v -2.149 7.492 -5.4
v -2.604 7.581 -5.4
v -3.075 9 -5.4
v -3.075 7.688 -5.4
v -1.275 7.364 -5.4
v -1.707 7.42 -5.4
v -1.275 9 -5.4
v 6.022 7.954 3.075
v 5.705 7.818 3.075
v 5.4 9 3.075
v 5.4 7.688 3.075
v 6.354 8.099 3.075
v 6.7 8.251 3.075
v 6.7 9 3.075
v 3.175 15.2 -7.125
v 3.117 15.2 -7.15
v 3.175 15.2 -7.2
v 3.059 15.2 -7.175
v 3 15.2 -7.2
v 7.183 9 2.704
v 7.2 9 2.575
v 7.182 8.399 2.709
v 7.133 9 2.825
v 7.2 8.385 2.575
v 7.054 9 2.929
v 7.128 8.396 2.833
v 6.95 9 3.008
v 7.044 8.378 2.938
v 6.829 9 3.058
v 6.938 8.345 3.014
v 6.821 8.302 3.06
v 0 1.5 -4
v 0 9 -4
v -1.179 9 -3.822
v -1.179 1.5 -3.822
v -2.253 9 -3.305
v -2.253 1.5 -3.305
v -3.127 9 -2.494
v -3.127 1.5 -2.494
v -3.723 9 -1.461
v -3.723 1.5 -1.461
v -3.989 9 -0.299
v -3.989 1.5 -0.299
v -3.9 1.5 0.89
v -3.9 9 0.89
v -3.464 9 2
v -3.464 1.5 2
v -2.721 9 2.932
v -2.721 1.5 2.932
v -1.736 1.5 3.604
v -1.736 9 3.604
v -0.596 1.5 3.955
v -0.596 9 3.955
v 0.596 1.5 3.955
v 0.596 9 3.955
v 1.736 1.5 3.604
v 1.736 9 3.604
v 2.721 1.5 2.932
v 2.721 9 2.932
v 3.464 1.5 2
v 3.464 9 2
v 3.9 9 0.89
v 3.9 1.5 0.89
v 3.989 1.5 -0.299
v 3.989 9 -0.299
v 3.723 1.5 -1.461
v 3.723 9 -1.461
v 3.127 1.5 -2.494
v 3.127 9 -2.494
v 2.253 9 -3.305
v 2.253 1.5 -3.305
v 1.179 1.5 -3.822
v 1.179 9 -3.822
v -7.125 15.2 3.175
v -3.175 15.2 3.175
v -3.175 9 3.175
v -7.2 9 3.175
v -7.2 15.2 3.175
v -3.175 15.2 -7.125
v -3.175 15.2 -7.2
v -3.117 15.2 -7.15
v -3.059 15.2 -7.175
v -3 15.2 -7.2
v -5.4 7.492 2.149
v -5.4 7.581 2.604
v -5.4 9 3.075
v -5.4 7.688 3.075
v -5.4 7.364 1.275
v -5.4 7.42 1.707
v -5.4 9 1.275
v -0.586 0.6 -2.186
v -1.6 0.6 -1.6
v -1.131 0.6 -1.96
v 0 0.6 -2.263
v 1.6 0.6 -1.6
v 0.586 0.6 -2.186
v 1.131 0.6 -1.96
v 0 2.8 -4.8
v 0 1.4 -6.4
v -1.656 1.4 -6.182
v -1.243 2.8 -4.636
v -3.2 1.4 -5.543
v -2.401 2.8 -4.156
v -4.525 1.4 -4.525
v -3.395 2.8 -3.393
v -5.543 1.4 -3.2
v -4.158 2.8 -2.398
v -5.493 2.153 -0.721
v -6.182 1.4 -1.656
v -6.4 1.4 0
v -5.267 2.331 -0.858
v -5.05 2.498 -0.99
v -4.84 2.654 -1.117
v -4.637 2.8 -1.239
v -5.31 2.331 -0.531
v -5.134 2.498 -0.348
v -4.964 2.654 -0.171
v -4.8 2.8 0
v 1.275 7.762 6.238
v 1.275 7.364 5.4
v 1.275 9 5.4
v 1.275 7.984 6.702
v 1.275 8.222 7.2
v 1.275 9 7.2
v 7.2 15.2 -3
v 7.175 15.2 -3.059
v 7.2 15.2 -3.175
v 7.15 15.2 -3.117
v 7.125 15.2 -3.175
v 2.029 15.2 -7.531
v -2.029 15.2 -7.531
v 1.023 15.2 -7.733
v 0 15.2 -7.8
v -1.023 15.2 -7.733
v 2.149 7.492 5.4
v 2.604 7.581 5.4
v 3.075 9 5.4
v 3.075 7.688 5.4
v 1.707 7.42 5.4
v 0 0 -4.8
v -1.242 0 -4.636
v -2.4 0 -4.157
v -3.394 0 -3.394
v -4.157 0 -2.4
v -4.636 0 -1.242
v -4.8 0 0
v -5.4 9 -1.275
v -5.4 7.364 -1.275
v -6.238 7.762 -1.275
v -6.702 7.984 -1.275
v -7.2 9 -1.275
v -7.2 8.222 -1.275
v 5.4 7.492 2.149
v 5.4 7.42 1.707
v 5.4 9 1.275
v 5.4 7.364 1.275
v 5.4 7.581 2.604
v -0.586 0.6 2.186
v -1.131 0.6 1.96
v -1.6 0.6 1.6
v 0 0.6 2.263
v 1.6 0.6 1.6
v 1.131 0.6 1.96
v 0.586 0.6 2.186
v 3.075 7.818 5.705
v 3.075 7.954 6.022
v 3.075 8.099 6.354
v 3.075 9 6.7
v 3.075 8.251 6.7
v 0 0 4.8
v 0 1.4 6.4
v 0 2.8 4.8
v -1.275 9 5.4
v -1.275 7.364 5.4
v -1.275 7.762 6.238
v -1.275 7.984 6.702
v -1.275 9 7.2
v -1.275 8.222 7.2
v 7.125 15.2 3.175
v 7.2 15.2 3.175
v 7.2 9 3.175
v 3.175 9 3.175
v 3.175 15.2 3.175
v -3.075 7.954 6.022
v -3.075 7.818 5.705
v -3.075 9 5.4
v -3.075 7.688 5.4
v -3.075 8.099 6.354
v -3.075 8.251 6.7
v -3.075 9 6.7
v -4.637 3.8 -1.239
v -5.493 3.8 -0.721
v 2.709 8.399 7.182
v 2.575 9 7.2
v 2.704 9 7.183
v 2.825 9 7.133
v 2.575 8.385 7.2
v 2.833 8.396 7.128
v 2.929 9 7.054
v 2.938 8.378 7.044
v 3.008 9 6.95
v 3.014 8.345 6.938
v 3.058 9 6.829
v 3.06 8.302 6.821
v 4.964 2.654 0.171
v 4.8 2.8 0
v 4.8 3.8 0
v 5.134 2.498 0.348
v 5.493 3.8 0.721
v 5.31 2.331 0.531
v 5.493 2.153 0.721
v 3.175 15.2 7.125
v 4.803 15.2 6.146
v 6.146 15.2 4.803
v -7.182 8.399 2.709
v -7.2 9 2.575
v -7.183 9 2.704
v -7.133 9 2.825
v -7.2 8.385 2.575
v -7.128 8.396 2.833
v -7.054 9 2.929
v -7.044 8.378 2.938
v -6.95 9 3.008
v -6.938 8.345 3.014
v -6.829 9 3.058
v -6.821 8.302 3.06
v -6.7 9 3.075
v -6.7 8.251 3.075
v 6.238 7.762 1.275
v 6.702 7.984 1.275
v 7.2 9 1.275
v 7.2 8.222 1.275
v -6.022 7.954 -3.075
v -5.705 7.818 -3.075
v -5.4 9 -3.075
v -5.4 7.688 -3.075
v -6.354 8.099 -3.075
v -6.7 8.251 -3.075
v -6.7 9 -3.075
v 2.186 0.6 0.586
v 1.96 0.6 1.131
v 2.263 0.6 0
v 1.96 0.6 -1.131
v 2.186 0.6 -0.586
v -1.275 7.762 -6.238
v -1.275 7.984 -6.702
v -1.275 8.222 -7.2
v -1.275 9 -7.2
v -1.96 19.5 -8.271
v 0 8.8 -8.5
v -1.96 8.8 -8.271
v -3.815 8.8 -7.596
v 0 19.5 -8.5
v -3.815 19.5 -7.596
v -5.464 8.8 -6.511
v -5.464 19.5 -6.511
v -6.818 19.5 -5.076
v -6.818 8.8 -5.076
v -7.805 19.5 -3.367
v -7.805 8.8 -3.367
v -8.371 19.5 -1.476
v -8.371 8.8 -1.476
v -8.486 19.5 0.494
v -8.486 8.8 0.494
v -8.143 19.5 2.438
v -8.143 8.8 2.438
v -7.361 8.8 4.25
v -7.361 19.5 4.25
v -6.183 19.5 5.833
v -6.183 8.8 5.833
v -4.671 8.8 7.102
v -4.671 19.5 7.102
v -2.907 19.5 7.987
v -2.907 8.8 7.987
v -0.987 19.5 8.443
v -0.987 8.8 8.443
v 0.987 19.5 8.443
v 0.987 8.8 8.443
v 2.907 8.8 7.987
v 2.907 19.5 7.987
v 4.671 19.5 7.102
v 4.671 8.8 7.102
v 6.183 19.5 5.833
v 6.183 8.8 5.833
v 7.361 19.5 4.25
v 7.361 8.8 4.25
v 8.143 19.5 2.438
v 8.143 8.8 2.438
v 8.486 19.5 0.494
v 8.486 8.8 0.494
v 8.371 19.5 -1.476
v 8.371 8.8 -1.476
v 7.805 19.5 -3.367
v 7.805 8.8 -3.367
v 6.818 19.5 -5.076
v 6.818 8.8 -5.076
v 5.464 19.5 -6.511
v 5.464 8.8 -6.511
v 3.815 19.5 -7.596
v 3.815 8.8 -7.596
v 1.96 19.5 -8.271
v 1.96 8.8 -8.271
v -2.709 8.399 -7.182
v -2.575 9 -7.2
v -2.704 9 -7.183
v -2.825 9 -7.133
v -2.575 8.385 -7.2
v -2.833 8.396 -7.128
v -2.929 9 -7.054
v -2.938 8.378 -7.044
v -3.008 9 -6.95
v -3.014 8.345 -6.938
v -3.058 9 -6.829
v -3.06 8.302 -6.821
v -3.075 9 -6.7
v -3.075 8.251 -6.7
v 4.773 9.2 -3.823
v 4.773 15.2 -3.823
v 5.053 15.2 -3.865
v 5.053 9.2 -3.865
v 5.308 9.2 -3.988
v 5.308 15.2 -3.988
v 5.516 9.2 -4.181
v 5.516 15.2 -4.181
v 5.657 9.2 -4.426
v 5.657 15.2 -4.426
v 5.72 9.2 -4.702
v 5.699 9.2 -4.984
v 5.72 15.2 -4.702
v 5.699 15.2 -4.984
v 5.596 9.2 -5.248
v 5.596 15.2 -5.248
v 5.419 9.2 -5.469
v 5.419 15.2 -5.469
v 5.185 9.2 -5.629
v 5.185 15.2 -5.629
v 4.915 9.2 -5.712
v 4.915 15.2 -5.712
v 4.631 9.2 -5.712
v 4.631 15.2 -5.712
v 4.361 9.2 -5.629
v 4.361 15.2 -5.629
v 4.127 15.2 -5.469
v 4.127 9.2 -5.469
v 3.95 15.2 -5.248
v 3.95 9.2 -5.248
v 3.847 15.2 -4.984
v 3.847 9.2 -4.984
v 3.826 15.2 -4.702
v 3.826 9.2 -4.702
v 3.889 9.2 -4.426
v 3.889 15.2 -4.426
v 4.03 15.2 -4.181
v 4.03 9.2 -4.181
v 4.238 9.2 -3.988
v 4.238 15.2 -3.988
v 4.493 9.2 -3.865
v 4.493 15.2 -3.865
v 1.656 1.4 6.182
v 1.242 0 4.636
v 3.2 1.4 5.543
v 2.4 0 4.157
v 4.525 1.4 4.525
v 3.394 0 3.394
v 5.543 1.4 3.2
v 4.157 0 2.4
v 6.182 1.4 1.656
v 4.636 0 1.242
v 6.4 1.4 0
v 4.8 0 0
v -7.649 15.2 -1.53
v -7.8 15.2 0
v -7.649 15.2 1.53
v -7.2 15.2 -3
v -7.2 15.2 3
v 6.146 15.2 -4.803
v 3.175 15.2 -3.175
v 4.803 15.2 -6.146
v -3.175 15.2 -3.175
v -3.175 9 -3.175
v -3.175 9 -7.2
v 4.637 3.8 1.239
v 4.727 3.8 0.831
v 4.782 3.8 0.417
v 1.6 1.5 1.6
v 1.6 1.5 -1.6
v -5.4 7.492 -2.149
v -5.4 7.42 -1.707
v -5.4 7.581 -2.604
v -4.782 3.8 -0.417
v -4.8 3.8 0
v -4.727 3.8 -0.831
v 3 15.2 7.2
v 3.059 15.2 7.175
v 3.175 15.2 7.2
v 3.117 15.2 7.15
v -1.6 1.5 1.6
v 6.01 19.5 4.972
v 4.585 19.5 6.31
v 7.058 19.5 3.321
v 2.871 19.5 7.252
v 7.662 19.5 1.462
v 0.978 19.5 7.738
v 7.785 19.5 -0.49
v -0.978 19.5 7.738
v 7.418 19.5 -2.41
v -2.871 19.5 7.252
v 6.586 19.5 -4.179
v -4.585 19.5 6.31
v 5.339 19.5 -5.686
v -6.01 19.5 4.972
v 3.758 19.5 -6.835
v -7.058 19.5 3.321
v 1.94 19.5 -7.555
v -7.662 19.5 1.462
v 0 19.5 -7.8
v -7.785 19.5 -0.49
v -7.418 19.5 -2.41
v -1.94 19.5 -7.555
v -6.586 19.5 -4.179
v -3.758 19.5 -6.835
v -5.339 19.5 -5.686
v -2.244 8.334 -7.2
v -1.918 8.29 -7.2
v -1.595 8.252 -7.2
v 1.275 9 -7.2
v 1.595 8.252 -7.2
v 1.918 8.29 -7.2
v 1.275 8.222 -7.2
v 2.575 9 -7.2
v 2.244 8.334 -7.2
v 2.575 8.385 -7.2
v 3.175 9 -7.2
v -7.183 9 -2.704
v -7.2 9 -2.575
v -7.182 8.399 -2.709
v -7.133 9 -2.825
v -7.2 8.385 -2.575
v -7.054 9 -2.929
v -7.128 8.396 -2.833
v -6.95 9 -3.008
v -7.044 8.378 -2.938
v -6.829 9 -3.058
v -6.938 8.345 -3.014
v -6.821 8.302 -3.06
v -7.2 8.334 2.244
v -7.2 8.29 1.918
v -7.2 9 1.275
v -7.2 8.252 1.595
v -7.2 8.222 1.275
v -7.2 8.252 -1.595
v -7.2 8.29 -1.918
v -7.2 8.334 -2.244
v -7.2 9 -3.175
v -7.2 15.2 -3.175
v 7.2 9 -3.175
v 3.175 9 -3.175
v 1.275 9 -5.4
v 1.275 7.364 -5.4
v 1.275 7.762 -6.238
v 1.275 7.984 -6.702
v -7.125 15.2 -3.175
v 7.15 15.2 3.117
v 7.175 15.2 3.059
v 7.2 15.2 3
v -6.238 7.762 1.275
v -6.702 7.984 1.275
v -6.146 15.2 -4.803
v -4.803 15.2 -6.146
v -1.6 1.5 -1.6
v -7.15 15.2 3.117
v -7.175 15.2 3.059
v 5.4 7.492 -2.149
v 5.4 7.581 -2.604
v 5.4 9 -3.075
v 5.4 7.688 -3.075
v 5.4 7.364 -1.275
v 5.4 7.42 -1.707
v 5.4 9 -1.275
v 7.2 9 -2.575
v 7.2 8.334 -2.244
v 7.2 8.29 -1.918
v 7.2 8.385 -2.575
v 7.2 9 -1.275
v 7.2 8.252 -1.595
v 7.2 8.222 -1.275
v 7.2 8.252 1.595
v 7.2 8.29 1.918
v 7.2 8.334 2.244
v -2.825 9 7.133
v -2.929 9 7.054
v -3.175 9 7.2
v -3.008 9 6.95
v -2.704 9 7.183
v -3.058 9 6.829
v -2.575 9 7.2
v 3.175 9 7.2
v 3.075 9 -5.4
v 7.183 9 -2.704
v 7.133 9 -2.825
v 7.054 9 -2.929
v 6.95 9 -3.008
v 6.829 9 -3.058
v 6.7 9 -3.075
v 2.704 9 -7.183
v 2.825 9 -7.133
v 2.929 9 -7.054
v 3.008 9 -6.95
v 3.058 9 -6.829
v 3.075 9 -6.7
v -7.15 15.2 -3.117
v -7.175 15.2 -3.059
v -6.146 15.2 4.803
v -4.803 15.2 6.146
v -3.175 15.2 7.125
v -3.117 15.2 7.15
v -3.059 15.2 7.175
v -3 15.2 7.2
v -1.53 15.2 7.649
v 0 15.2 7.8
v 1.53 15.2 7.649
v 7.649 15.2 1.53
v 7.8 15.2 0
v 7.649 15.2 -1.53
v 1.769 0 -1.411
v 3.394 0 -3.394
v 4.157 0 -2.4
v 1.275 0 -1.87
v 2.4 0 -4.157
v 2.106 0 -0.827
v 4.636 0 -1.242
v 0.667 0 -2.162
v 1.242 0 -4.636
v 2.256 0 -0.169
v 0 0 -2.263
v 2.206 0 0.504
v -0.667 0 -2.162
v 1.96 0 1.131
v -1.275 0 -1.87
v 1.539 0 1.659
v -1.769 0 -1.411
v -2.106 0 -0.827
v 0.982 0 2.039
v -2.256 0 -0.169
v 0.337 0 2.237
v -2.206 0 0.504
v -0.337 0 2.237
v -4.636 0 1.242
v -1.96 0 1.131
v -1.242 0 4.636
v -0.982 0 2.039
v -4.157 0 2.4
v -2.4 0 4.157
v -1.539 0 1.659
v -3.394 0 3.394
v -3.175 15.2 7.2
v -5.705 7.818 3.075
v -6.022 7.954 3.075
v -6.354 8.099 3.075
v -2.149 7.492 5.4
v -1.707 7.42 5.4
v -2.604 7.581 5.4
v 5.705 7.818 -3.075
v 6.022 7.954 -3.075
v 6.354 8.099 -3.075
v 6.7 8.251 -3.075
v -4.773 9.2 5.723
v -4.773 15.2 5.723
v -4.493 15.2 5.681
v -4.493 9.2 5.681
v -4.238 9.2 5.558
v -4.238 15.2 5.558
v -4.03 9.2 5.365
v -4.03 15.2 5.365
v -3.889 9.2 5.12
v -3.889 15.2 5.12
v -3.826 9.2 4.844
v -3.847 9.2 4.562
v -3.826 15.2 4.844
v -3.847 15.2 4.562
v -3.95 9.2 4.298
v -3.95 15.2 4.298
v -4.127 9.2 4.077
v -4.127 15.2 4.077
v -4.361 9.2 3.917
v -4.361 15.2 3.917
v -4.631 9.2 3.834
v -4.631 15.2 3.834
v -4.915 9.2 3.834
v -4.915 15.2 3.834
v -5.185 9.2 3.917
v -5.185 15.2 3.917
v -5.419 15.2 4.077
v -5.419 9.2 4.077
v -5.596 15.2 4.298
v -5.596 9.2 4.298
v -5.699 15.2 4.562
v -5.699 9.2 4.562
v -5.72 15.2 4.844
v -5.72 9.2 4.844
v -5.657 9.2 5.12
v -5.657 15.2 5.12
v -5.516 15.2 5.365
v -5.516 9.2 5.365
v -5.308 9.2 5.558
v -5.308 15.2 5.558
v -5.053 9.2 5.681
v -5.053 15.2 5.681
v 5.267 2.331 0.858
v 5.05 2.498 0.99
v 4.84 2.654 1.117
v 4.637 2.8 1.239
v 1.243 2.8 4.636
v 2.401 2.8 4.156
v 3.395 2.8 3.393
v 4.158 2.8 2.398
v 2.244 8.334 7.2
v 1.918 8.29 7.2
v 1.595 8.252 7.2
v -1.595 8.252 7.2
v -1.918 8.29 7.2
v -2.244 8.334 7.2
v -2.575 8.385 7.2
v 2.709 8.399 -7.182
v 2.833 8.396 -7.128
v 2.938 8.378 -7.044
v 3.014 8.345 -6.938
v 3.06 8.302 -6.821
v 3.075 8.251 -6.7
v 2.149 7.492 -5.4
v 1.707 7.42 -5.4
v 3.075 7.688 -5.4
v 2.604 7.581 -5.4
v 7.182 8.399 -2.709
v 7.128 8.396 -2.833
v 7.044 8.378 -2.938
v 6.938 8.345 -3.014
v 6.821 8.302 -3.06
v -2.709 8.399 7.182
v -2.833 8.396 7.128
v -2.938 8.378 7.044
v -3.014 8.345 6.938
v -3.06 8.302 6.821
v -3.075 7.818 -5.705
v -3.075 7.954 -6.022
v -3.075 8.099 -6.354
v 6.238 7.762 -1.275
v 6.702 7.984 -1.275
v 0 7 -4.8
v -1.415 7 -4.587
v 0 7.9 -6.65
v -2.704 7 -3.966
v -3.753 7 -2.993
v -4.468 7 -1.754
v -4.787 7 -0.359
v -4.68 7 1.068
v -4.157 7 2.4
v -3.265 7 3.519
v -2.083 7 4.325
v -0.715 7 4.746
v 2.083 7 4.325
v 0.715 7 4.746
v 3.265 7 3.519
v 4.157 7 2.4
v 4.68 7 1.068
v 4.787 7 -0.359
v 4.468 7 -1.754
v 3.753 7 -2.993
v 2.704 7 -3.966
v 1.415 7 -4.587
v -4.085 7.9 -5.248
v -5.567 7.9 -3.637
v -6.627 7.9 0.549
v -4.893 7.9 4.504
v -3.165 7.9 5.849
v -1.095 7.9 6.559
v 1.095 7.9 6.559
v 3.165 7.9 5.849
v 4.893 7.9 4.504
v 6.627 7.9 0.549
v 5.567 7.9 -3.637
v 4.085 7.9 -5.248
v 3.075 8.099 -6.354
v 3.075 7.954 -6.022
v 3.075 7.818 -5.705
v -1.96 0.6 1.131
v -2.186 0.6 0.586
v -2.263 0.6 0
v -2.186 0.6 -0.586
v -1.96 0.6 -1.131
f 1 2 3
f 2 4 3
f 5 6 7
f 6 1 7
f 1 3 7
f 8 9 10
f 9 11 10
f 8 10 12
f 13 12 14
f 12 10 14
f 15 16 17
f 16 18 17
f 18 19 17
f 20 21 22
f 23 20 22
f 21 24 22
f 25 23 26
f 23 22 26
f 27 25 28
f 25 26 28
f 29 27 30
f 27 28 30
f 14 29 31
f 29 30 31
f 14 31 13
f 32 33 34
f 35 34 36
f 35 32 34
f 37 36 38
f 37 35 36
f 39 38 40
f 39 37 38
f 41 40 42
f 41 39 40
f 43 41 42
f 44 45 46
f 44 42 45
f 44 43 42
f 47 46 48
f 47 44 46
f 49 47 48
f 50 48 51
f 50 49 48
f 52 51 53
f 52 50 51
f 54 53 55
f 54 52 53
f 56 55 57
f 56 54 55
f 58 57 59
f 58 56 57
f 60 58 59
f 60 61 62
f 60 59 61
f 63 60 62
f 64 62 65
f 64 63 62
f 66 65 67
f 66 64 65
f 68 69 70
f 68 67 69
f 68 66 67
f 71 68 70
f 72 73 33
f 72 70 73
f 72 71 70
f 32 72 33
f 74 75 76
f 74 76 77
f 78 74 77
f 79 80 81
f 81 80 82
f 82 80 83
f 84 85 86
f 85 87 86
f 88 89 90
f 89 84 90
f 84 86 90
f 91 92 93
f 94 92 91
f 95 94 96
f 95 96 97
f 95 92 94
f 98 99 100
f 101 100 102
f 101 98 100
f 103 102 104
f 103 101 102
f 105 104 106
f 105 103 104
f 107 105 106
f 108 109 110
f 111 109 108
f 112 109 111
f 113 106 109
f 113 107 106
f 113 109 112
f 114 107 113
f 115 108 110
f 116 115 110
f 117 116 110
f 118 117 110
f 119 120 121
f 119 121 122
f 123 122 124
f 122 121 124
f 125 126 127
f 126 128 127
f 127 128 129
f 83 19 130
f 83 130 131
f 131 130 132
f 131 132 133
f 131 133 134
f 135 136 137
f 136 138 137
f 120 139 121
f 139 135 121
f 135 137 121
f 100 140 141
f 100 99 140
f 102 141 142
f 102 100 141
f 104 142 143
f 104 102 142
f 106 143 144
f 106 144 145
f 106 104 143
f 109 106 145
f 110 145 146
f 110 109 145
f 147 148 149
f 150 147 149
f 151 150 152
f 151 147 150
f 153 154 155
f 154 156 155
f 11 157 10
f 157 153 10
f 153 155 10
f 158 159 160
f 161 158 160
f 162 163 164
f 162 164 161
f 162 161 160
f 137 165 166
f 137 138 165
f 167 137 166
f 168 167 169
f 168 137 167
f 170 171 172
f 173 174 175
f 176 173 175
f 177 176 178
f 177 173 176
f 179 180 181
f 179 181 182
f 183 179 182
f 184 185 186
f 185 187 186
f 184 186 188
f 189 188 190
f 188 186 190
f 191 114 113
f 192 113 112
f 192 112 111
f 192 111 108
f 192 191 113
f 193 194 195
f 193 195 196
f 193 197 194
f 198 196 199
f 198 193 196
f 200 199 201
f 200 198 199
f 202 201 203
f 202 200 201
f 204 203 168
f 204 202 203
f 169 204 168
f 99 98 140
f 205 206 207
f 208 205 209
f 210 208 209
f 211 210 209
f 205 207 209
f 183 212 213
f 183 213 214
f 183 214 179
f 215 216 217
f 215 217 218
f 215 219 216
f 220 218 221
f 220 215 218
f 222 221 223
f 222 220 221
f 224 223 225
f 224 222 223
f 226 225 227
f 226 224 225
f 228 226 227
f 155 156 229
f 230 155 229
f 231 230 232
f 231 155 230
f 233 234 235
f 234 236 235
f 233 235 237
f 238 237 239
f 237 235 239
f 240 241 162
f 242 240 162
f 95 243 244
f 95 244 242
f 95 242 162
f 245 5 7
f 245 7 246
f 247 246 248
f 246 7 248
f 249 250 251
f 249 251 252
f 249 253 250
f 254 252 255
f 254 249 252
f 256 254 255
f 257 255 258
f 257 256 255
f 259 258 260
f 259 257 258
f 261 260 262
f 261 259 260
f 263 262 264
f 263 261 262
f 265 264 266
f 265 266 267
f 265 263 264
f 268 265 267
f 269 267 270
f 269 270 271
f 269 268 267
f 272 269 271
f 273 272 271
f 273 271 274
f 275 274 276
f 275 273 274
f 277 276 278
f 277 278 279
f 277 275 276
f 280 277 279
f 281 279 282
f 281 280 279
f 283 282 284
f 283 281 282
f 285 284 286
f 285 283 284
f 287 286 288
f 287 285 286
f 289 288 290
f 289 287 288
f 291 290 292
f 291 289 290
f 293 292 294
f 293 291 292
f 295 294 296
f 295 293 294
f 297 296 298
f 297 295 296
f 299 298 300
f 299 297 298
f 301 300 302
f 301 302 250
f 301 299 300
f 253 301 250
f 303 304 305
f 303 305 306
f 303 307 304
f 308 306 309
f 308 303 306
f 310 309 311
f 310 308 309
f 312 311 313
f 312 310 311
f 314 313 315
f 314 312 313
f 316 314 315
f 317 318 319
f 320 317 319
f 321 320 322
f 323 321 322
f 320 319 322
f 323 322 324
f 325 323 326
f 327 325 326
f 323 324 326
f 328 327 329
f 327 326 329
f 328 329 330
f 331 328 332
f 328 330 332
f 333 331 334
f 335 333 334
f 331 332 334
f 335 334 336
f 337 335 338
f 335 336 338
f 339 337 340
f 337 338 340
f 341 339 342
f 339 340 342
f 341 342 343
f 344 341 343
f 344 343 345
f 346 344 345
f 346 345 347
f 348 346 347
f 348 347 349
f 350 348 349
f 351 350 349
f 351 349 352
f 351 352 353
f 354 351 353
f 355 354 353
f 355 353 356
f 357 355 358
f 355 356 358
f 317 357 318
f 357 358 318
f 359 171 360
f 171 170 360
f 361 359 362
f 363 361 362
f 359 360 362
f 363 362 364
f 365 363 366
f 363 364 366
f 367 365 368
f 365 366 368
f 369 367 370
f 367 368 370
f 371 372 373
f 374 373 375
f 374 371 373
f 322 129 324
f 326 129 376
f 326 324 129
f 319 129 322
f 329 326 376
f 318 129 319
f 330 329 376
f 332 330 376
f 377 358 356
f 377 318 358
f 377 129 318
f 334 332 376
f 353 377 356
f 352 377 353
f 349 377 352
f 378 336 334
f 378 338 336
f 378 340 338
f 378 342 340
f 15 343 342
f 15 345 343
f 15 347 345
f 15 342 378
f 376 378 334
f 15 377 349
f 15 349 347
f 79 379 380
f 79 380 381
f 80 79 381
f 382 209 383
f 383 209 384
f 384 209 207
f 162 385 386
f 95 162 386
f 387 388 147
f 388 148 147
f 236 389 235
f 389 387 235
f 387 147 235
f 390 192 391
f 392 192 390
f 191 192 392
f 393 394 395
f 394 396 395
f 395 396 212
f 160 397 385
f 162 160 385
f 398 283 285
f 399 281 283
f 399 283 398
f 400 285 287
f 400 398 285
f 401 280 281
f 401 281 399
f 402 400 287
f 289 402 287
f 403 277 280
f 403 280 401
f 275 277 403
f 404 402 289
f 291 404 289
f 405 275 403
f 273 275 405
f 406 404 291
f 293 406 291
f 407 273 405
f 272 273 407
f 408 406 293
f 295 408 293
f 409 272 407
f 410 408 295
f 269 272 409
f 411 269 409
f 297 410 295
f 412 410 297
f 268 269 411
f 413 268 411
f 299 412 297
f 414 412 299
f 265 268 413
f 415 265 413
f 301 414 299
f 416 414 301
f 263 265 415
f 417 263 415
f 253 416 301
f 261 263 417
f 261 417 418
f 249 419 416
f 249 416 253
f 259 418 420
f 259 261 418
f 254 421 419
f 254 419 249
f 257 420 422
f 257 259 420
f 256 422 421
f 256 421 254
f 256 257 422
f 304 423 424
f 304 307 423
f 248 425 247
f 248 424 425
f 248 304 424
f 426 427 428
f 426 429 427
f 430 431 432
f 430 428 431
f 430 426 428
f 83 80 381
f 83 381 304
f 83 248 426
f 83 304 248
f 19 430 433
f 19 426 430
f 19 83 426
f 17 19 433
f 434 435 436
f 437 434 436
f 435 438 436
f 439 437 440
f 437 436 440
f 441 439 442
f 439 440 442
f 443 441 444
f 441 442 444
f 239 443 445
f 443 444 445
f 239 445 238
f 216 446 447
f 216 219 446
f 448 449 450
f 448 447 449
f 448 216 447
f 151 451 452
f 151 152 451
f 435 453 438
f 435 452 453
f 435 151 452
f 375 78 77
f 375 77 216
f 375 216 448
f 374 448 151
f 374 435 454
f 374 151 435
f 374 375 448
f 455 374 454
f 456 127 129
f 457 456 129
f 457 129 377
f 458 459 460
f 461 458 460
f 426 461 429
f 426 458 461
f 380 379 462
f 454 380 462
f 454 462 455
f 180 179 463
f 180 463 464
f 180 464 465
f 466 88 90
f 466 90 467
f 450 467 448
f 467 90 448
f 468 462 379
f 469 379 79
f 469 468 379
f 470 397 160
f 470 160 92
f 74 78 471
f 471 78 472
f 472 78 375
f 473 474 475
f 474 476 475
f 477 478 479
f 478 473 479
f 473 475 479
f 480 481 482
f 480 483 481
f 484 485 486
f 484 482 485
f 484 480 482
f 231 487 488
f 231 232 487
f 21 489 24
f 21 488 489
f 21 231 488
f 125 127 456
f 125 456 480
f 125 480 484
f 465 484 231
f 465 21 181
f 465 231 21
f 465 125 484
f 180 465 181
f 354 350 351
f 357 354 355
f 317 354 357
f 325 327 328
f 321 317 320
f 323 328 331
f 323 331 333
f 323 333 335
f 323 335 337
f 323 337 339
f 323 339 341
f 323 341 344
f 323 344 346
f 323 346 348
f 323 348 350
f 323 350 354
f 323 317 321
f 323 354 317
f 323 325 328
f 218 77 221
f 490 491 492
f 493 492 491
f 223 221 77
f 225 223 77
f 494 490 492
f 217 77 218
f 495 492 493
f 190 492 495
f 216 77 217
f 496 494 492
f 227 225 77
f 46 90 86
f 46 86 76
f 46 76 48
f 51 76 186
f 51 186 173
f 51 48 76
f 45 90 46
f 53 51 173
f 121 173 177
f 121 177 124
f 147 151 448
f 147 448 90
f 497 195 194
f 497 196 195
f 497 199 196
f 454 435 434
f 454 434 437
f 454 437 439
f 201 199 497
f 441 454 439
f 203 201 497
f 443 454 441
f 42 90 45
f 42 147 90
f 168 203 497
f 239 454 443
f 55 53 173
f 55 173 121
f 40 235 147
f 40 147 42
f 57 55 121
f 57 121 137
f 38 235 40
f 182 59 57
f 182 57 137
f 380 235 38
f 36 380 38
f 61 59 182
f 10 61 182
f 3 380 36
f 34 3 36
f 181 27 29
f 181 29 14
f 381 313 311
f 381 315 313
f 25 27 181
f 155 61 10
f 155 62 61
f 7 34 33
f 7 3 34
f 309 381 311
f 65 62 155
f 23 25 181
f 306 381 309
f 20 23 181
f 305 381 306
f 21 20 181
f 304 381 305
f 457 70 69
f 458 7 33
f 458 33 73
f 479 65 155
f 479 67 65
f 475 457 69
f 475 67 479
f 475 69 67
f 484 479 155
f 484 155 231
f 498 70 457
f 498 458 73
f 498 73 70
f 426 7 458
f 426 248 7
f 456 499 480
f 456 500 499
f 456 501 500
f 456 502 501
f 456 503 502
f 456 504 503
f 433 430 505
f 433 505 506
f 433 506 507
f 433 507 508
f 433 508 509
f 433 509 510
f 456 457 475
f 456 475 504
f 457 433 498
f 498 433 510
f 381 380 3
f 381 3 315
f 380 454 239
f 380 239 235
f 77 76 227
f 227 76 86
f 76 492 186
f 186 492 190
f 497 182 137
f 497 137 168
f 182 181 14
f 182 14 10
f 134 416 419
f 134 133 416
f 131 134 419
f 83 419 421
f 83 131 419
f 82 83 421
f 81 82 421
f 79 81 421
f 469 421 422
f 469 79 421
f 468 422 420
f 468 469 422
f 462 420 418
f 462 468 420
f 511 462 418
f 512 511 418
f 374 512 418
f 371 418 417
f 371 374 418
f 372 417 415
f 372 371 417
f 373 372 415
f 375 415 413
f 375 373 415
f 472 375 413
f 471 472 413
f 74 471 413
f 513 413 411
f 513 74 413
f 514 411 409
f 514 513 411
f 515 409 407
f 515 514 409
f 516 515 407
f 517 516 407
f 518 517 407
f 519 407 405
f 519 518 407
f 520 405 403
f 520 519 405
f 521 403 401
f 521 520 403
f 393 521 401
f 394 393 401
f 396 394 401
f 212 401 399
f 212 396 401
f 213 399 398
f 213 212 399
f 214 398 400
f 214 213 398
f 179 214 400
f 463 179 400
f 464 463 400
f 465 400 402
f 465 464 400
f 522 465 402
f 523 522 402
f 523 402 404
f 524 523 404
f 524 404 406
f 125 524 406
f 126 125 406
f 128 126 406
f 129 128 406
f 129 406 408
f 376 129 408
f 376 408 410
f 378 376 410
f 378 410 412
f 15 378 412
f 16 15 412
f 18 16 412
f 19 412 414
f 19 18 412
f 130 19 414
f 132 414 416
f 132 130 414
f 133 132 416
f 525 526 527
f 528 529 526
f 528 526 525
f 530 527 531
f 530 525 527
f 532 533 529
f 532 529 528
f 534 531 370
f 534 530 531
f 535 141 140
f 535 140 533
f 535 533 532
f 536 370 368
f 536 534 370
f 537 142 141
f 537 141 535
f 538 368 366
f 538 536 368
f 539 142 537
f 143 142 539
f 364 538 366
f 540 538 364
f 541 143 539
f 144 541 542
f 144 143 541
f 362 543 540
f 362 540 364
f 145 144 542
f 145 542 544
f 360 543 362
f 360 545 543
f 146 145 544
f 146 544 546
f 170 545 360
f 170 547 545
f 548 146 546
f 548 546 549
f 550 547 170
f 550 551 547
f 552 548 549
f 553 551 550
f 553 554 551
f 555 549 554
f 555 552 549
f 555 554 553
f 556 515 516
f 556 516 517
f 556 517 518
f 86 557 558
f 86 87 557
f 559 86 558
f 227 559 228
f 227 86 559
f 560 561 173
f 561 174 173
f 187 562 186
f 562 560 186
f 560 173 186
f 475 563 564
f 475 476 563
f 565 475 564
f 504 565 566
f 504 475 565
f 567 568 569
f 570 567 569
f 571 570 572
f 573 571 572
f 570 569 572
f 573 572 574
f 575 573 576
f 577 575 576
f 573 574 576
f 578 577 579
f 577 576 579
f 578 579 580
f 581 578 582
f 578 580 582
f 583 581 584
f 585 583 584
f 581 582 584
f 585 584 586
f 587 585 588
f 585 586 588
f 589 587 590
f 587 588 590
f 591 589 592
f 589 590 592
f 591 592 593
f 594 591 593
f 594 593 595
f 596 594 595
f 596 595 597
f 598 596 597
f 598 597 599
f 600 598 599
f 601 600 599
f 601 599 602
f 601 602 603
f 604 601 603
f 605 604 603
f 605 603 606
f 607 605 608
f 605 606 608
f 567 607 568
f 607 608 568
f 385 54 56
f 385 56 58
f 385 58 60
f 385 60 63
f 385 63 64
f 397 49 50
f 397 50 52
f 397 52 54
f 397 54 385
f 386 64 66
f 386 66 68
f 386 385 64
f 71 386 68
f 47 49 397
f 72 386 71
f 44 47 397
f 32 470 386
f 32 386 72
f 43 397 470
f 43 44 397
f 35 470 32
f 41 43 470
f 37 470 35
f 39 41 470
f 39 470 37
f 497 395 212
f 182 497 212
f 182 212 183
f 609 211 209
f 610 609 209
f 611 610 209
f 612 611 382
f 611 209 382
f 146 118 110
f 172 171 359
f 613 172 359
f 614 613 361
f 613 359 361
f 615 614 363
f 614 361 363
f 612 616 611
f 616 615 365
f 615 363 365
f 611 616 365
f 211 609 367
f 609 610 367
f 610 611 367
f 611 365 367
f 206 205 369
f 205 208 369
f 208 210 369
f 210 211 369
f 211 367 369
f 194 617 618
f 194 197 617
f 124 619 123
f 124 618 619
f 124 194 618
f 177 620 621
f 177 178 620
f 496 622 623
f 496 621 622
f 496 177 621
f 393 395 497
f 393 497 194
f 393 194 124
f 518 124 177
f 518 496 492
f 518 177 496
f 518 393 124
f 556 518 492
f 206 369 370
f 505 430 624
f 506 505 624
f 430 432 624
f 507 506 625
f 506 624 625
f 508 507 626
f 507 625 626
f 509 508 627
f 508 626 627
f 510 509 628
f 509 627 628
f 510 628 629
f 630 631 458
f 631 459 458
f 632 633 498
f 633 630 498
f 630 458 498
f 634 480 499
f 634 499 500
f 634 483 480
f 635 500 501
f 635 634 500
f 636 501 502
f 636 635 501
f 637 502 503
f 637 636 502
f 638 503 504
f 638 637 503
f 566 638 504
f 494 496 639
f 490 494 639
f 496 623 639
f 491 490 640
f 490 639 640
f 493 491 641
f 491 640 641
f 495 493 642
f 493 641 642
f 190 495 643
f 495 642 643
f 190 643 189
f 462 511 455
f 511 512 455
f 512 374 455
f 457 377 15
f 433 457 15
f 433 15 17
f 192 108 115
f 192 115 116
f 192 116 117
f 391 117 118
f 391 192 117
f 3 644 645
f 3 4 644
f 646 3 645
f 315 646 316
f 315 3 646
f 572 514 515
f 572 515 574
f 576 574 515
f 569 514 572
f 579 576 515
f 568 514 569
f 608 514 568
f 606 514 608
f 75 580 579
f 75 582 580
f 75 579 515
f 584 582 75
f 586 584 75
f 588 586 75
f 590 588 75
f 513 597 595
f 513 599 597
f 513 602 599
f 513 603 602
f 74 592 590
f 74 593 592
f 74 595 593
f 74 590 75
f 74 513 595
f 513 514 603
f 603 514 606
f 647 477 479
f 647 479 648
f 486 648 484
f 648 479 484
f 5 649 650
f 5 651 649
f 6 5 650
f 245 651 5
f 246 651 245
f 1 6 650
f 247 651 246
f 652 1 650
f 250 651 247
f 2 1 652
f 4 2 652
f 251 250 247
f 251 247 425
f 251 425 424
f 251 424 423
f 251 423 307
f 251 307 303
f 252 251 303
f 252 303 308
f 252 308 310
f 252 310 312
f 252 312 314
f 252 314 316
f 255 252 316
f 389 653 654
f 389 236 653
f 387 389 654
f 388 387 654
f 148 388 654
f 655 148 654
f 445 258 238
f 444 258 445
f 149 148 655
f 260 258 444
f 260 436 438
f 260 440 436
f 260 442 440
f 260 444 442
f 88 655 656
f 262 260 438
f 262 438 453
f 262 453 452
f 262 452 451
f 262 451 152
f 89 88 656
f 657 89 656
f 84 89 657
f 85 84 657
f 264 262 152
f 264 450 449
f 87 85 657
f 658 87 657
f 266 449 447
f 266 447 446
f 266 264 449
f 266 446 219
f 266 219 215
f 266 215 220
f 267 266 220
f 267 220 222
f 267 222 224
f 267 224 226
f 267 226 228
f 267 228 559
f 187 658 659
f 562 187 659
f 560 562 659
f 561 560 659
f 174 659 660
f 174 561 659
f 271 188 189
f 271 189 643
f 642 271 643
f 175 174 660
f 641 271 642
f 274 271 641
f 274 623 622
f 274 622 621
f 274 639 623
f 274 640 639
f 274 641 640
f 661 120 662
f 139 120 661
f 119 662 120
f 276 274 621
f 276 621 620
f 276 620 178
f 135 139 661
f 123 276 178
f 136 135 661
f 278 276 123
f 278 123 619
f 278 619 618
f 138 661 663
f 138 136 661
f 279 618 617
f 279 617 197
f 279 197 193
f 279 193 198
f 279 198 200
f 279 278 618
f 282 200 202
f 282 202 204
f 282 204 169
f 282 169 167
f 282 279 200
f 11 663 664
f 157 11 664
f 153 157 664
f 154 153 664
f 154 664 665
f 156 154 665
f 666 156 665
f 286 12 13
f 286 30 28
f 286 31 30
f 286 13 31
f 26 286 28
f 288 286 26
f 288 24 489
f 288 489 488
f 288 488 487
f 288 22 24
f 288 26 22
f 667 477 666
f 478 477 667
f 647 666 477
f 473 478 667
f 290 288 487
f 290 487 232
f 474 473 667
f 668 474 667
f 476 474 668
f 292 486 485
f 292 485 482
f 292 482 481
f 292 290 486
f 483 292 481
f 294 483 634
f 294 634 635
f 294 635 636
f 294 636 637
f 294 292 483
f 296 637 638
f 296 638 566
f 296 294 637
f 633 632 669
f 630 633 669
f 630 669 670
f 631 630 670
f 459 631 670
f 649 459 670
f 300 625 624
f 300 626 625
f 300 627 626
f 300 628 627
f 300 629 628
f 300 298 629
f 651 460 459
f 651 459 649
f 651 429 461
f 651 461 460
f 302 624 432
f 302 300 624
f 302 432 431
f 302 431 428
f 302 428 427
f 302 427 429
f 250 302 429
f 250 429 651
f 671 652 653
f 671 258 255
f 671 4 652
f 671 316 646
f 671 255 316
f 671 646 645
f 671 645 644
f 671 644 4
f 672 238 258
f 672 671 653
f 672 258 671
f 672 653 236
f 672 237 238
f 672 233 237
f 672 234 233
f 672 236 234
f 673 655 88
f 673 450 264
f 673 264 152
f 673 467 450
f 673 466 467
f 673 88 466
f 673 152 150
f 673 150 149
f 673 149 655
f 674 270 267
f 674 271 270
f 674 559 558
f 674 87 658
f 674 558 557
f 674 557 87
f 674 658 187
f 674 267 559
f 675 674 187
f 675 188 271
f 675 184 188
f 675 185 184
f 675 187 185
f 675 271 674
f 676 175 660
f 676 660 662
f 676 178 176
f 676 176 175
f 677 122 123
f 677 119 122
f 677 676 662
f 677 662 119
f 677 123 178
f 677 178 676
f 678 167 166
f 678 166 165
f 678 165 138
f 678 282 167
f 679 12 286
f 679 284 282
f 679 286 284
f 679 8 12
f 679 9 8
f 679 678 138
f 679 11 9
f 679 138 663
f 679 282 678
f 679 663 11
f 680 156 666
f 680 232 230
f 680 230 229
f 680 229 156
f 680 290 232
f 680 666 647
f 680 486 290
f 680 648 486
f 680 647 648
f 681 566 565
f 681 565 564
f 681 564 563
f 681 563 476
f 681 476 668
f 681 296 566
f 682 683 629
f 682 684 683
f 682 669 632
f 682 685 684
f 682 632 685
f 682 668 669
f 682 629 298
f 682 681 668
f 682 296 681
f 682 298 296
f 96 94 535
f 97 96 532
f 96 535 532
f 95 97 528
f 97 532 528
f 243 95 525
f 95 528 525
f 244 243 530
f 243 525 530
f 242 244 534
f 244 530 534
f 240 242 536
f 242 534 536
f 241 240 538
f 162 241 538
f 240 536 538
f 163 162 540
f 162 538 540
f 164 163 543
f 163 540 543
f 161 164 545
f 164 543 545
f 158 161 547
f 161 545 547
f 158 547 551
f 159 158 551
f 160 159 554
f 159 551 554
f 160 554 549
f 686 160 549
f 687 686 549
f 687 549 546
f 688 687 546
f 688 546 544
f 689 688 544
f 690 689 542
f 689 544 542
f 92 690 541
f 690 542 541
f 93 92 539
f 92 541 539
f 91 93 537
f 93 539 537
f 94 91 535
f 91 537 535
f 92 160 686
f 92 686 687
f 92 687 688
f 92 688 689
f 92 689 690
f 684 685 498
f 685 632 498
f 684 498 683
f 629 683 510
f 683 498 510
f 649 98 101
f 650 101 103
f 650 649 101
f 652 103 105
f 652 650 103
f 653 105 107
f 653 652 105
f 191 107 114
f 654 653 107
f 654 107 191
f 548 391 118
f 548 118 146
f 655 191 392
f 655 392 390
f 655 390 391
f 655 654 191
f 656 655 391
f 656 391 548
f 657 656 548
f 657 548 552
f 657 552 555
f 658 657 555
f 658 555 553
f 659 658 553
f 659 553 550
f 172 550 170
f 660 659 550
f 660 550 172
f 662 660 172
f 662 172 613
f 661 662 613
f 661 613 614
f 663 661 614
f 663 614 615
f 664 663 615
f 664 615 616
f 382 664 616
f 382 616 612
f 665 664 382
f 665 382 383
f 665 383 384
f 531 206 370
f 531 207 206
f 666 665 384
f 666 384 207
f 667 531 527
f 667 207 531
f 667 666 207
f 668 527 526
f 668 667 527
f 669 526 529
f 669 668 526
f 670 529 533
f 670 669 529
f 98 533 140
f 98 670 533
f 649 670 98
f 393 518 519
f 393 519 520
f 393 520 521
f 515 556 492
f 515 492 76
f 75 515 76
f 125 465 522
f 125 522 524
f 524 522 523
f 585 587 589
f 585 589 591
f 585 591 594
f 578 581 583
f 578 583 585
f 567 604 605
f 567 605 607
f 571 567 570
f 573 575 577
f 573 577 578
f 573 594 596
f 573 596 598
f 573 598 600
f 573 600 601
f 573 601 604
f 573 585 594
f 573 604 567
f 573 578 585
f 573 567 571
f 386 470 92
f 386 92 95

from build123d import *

# Parameters (mm, degrees)
SKETCH2_W                       = 6.35
SKETCH2_H                       = 14.4
CUT_EXTRUDE1_DEPTH              = 6.2
CIRPATTERN1_COUNT               = 4
SKETCH3_W                       = 3.2
SKETCH3_H                       = 3.2
CUT_EXTRUDE2_DEPTH              = 22.644860822
SKETCH4_W                       = 1.8
SKETCH4_H                       = 1.8
CUT_EXTRUDE3_DEPTH              = 16.9608897
FILLET1_R                       = 0.5
CIRPATTERN2_COUNT               = 4
FILLET1_OF_CIRPATTERN2_R        = 0.5
SKETCH5_R                       = 0.95
CUT_EXTRUDE4_DEPTH              = 6
REVOLVE2_ANGLE                  = 90
BOSS_EXTRUDE1_DEPTH             = 1
BOSS_EXTRUDE1_DIRECTION_2_REACH = 22.576
SKETCH8_R                       = 2.2627417
CUT_EXTRUDE5_DEPTH              = 0.6


with BuildPart() as part:
    # Sketch1 → Revolve1 (revolve)
    with BuildSketch(Plane.XY, mode=Mode.PRIVATE) as revolve1_sk:
        Polygon((0, 0), (4.8, 0), (4.8, 7), (8.5, 8.8), (8.5, 19.5), (7.8, 19.5), (7.8, 15.2), (4.25, 15.2), (4.25, 9), (4, 9), (4, 1.5), (0, 1.5), align=None)
    revolve(revolve1_sk.sketch.rotate(Axis((0, 0, 0), (0, 1, 0)), 90), axis=Axis((0, 0, 0), (0, 1, 0)))

    # Sketch2 → Cut-Extrude1 (cut)
    with BuildSketch(Plane(origin=(0, 15.2, 0), x_dir=(1, 0, 0), z_dir=(0, 1, 0))):
        Rectangle(SKETCH2_W, SKETCH2_H)
    cut_extrude1 = extrude(amount=-CUT_EXTRUDE1_DEPTH, mode=Mode.SUBTRACT)

    # CirPattern1: Cut-Extrude1 ×4 about axis
    cirpattern1_axis = Axis((0, 0, 0), (0, 1, 0))
    for i in range(1, CIRPATTERN1_COUNT):
        add(cut_extrude1.rotate(cirpattern1_axis, i * 360 / CIRPATTERN1_COUNT), mode=Mode.SUBTRACT)

    # Sketch3 → Cut-Extrude2 (cut, through all)
    with BuildSketch(Plane(origin=(0, 1.5, 0), x_dir=(1, 0, 0), z_dir=(0, 1, 0))):
        Rectangle(SKETCH3_W, SKETCH3_H)
    extrude(amount=-CUT_EXTRUDE2_DEPTH, mode=Mode.SUBTRACT)

    # Sketch4 → Cut-Extrude3 (cut, through all)
    with BuildSketch(Plane(origin=(0, 9, 0), x_dir=(1, 0, 0), z_dir=(0, 1, 0))):
        with Locations((-2.175, 6.3)):
            Rectangle(SKETCH4_W, SKETCH4_H)
        with Locations((2.175, 6.3)):
            Rectangle(SKETCH4_W, SKETCH4_H)
    cut_extrude3 = extrude(amount=-CUT_EXTRUDE3_DEPTH, mode=Mode.SUBTRACT)

    # Fillet1
    fillet1_edges = [part.edges().sort_by_distance(p)[0] for p in [
        (3.075, 8.736820818, -7.2),
        (-3.075, 8.736820818, -7.2),
    ]]
    fillet(fillet1_edges, radius=FILLET1_R)

    # CirPattern2: Cut-Extrude3 ×4 about axis
    cirpattern2_axis = Axis((0, 0, 0), (0, 1, 0))
    for i in range(1, CIRPATTERN2_COUNT):
        add(cut_extrude3.rotate(cirpattern2_axis, i * 360 / CIRPATTERN2_COUNT), mode=Mode.SUBTRACT)

    # Fillet1 of CirPattern2
    fillet1_of_cirpattern2_edges = [part.edges().sort_by_distance(p)[0] for p in [
        (-7.2, 8.736820818, -3.075),
        (-7.2, 8.736820818, 3.075),
        (-3.075, 8.736820818, 7.2),
        (3.075, 8.736820818, 7.2),
        (7.2, 8.736820818, 3.075),
        (7.2, 8.736820818, -3.075),
    ]]
    fillet(fillet1_of_cirpattern2_edges, radius=FILLET1_OF_CIRPATTERN2_R)

    # Sketch5 → Cut-Extrude4 (cut)
    with BuildSketch(Plane(origin=(0, 15.2, 0), x_dir=(1, 0, 0), z_dir=(0, 1, 0))):
        with Locations(Location((4.772970773, 4.772970773, 0), (0, 0, 270))):
            Circle(SKETCH5_R)
        with Locations(Location((-4.772970773, -4.772970773, 0), (0, 0, 270))):
            Circle(SKETCH5_R)
    extrude(amount=-CUT_EXTRUDE4_DEPTH, mode=Mode.SUBTRACT)

    # Sketch6 → Revolve2 (revolve)
    with BuildSketch(Plane(origin=(0, 0, 0), x_dir=(0, 0, -1), z_dir=(1, 0, 0))):
        Polygon((-4.8, 2.8), (-6.4, 1.4), (-4.8, 0), align=None)
        Polygon((4.8, 2.8), (4.8, 0), (6.4, 1.4), align=None)
    revolve(axis=Axis((0, 0, 0), (0, 1, 0)), revolution_arc=REVOLVE2_ANGLE)

    # Sketch7 → Boss-Extrude1 (add)
    with BuildSketch(Plane(origin=(0, 2.8, 0), x_dir=(1, 0, 0), z_dir=(0, 1, 0))):
        Polygon((4.8, 0), (5.492598815, -0.721323008), (4.637239583, -1.239358321), align=None)
        Polygon((-4.8, 0), (-4.637239583, 1.239358321), (-5.492598815, 0.721323008), align=None)
    extrude(amount=BOSS_EXTRUDE1_DEPTH)

    # Boss-Extrude1 direction 2: up to this cone (the profile starts outside it)
    boss_extrude1_direction_2_end = Plane(origin=(0, 2.8, 0), z_dir=(0, -1, 0)).offset(-4.199999) * Cone(1.143e-06, 36.658285714, 32.075999, align=(Align.CENTER, Align.CENTER, Align.MIN), mode=Mode.PRIVATE)
    # Sketch7 → Boss-Extrude1 direction 2 (add, up to the surface)
    with BuildSketch(Plane(origin=(0, 2.8, 0), x_dir=(1, 0, 0), z_dir=(0, 1, 0)), mode=Mode.PRIVATE) as boss_extrude1_direction_2_sk1:
        Polygon((4.8, 0), (5.492598815, -0.721323008), (4.637239583, -1.239358321), align=None)
    boss_extrude1_direction_2_tool1 = extrude(boss_extrude1_direction_2_sk1.sketch, amount=-BOSS_EXTRUDE1_DIRECTION_2_REACH, mode=Mode.PRIVATE) - boss_extrude1_direction_2_end
    add(boss_extrude1_direction_2_tool1.solids().sort_by_distance((4.976613, 2.8, 0.65356))[0])
    # Sketch7 → Boss-Extrude1 direction 2 (add, up to the surface)
    with BuildSketch(Plane(origin=(0, 2.8, 0), x_dir=(1, 0, 0), z_dir=(0, 1, 0)), mode=Mode.PRIVATE) as boss_extrude1_direction_2_sk2:
        Polygon((-4.8, 0), (-4.637239583, 1.239358321), (-5.492598815, 0.721323008), align=None)
    boss_extrude1_direction_2_tool2 = extrude(boss_extrude1_direction_2_sk2.sketch, amount=-BOSS_EXTRUDE1_DIRECTION_2_REACH, mode=Mode.PRIVATE) - boss_extrude1_direction_2_end
    add(boss_extrude1_direction_2_tool2.solids().sort_by_distance((-4.976613, 2.8, -0.65356))[0])

    # Sketch8 → Cut-Extrude5 (cut)
    with BuildSketch(Plane.XZ):
        with Locations(Location((0, 0, 0), (0, 0, 270))):
            Circle(SKETCH8_R)
    extrude(amount=-CUT_EXTRUDE5_DEPTH, mode=Mode.SUBTRACT)


solid = part.part
